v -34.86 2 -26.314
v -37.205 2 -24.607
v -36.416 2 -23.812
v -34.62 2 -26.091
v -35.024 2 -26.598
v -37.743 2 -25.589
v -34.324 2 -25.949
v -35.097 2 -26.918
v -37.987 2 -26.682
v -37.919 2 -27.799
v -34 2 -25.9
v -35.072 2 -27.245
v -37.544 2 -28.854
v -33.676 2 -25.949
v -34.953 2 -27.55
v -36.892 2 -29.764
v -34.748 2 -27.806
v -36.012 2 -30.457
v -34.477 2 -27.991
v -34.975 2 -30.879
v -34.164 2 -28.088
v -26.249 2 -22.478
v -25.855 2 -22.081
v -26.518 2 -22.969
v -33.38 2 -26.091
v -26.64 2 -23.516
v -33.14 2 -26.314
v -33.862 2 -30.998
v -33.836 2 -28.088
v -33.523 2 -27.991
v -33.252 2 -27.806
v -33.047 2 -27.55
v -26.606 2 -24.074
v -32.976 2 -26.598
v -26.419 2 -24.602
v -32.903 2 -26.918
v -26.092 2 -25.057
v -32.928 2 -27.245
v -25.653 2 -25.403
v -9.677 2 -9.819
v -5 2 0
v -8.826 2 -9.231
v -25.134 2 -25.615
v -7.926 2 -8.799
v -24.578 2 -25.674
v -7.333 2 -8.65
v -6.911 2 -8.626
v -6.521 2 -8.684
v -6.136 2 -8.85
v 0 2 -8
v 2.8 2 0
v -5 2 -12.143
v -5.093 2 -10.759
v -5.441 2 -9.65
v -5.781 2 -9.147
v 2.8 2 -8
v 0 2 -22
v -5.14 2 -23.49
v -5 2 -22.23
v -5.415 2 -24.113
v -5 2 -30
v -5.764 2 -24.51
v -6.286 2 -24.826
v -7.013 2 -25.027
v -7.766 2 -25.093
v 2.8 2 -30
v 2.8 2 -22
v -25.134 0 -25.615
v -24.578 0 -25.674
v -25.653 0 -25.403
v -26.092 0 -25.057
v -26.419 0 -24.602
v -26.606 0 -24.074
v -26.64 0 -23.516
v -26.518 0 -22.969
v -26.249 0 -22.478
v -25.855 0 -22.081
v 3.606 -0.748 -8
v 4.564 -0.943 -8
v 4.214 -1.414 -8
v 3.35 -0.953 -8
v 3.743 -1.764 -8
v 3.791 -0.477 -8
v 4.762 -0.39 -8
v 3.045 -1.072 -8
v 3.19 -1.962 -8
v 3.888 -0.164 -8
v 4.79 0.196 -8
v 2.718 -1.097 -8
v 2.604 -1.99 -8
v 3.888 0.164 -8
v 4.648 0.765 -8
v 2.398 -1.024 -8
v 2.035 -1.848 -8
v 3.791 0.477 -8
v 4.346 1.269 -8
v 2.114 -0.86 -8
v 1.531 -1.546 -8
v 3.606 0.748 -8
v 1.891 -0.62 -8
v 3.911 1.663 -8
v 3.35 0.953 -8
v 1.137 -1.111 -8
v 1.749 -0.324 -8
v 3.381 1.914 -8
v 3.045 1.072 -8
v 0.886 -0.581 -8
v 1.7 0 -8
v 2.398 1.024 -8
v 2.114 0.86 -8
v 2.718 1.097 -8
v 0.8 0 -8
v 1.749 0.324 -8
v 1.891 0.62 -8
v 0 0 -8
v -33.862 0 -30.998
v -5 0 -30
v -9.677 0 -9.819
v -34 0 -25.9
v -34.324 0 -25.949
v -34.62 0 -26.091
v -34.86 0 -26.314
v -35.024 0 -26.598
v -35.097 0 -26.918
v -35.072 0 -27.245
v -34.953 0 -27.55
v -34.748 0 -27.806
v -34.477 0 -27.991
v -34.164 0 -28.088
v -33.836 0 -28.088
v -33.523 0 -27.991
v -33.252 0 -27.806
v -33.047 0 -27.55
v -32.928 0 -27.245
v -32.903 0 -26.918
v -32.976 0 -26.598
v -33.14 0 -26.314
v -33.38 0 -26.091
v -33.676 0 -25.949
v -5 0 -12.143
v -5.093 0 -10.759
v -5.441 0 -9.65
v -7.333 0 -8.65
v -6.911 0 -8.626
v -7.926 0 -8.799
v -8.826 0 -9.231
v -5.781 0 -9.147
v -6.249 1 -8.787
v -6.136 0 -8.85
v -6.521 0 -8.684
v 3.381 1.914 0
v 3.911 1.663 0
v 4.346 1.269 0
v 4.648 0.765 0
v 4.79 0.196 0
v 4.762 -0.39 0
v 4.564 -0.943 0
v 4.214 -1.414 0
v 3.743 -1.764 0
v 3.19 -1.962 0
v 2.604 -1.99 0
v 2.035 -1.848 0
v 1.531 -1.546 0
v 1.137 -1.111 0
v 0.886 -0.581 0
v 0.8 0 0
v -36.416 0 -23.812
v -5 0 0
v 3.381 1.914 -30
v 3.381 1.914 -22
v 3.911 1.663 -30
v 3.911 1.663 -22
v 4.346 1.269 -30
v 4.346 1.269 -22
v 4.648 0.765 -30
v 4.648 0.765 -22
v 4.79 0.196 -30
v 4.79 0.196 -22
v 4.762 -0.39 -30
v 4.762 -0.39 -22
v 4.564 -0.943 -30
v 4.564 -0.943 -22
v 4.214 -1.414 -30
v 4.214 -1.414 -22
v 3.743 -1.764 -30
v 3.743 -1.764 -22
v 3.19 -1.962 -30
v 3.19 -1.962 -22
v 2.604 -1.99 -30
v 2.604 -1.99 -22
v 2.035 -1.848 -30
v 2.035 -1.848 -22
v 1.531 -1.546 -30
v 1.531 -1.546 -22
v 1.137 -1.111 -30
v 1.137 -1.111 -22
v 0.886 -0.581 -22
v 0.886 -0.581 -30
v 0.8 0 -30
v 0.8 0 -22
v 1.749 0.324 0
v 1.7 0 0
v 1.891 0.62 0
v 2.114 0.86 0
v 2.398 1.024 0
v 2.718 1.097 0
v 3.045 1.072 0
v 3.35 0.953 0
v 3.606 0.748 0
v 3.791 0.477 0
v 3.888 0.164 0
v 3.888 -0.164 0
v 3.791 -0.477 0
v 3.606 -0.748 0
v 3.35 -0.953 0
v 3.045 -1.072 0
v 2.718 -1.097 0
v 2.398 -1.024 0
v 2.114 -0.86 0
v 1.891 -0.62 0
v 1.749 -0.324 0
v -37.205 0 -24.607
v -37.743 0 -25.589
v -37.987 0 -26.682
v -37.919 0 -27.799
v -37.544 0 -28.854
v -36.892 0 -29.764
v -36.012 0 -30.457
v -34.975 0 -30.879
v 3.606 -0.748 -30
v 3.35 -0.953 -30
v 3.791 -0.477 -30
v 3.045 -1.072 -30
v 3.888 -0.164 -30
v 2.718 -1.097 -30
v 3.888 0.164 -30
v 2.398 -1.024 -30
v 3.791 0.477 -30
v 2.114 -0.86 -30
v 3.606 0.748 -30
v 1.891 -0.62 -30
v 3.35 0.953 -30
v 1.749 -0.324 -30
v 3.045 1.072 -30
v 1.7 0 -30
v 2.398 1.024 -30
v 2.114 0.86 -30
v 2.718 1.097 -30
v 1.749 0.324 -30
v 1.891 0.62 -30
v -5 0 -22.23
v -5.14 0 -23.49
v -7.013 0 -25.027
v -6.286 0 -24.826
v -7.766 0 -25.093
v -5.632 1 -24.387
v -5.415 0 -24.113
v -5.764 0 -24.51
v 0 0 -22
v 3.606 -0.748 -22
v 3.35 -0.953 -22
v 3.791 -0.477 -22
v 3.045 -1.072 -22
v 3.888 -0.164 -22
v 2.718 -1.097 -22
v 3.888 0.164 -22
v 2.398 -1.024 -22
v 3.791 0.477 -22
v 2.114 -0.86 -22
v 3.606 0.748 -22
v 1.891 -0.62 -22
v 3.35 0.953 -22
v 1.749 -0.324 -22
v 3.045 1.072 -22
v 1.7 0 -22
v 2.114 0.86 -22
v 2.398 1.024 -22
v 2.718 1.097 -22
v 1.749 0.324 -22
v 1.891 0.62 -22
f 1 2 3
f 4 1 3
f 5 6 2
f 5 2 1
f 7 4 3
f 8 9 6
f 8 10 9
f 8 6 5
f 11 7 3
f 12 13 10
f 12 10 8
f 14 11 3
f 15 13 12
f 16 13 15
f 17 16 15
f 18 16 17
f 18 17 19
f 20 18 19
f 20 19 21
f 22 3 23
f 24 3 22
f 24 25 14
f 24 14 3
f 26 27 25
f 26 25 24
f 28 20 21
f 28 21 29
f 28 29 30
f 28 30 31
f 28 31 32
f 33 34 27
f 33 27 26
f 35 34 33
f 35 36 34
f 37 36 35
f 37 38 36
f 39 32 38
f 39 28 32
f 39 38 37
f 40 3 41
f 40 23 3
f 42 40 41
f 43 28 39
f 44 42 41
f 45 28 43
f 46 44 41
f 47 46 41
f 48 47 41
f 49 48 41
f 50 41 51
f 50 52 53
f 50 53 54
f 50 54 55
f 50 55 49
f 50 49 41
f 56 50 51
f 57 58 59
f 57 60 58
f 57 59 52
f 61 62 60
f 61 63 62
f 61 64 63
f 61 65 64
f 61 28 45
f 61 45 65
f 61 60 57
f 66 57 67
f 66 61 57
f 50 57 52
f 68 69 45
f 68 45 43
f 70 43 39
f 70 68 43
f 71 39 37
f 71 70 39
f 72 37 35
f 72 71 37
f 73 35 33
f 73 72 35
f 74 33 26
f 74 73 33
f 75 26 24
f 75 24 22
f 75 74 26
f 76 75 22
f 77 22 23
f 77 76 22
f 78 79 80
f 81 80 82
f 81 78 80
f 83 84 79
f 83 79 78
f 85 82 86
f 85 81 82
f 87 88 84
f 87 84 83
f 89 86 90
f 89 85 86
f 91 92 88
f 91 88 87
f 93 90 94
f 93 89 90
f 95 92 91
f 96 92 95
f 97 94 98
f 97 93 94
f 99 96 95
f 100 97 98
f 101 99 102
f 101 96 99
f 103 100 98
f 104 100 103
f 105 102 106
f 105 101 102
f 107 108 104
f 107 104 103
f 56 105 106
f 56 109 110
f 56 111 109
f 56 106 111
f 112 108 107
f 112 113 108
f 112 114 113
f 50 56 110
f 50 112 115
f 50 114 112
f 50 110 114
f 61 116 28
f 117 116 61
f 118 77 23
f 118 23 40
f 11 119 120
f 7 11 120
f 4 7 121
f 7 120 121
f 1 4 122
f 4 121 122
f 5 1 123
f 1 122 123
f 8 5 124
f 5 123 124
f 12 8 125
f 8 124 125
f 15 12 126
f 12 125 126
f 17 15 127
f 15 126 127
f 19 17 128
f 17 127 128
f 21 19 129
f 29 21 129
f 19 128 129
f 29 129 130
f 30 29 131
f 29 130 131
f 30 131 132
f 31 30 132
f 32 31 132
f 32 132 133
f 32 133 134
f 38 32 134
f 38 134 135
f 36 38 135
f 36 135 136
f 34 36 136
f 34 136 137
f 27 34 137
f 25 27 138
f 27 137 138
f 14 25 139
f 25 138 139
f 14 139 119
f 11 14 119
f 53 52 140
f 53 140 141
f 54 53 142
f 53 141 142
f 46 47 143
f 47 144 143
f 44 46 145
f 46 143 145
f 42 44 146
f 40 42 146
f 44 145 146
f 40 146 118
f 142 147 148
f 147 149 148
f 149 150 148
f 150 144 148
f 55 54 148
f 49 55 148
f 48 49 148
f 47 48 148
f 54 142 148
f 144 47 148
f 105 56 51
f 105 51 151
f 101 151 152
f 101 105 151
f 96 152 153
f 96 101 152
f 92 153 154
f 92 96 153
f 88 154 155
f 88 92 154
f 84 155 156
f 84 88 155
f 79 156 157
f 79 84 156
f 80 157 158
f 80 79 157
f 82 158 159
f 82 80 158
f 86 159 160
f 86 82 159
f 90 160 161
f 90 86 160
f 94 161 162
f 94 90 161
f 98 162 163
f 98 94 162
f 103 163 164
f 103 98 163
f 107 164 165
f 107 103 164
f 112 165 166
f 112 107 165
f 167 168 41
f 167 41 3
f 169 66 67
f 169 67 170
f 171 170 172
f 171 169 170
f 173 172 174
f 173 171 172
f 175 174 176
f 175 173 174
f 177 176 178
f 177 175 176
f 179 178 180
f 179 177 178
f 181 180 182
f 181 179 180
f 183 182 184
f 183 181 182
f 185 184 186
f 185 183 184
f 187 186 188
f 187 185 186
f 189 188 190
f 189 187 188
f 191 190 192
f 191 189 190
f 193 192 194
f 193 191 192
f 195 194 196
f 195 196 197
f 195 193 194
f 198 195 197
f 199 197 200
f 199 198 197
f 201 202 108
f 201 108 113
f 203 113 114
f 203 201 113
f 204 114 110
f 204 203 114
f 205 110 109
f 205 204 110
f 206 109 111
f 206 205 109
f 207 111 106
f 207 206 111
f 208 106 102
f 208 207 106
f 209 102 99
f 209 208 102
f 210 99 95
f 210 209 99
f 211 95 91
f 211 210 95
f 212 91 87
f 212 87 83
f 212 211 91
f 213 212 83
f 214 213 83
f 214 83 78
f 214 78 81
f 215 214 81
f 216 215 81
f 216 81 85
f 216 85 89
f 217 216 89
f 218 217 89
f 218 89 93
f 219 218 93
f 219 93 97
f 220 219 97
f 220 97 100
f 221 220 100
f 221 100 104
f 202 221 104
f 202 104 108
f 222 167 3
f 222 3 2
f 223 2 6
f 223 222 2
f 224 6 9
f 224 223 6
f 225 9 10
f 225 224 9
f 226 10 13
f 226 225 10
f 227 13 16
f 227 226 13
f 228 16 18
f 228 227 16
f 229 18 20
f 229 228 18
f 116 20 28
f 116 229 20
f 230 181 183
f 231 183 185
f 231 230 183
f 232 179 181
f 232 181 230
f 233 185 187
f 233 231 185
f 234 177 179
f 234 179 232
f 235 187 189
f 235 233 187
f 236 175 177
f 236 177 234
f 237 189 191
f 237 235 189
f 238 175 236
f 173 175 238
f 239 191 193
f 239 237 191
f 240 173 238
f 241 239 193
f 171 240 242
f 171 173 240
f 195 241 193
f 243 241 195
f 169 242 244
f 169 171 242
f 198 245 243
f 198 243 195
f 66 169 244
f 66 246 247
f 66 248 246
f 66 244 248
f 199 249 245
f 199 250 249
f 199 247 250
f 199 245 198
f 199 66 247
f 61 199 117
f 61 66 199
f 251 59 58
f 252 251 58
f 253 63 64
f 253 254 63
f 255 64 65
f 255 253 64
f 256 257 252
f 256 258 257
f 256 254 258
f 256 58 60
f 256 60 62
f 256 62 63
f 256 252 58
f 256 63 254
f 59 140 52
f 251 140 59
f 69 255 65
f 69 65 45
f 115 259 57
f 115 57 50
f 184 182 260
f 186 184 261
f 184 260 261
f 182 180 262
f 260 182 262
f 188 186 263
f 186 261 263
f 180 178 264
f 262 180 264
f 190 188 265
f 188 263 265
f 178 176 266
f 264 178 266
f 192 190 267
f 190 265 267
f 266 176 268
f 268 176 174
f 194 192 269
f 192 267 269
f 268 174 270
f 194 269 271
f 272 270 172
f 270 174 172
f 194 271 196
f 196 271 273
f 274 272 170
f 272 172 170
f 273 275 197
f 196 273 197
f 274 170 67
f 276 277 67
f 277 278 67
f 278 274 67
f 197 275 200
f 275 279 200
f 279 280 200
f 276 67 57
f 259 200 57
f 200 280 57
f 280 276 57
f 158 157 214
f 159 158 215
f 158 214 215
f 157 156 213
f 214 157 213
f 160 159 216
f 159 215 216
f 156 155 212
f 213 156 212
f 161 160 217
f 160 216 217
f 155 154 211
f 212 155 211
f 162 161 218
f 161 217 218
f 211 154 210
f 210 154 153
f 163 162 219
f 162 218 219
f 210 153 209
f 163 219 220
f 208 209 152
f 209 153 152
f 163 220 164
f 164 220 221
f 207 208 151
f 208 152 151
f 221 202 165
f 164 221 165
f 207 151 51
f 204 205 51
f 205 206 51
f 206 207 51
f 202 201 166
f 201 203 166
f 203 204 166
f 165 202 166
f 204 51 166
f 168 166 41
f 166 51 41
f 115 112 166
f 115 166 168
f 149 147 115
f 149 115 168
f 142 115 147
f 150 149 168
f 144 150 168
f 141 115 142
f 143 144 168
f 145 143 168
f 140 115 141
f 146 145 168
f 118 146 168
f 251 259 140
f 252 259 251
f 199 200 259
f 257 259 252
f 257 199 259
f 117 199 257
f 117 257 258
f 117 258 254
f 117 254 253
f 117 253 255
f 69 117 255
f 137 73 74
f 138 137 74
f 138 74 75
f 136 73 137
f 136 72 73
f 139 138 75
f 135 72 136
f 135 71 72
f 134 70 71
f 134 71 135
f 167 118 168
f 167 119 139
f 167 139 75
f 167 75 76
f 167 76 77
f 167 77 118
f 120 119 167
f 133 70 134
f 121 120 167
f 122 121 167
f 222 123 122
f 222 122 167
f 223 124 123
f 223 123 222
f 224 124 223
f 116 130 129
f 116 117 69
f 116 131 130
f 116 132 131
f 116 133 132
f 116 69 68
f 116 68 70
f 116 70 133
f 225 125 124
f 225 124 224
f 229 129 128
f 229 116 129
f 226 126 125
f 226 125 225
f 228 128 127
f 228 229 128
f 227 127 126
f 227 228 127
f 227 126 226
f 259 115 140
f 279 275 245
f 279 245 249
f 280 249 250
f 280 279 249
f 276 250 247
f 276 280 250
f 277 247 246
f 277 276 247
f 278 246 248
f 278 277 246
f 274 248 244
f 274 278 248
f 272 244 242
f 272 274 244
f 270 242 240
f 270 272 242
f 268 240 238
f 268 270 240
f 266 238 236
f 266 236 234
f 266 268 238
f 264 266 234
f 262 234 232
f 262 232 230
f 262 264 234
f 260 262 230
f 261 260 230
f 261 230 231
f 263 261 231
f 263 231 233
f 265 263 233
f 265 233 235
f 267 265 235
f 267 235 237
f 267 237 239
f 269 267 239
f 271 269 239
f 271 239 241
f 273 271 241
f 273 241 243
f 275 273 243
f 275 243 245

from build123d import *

# Parameters (mm, degrees)
SKETCH_1_R              = 1.1
EXTRUDE_1_DEPTH         = 2
EXTRUDE_2_DEPTH         = 8
EXTRUDE_START           = -22
EXTRUDE_3_DEPTH         = 8
HOLE_WIZARD_2_2_2_2_1_D = 2.2


with BuildPart() as part:
    # 草图1 → 凸台-拉伸1 (new body)
    with BuildSketch(Plane(origin=(0, 0, 0), x_dir=(1, 0, 0), z_dir=(0, 1, 0))):
        with BuildLine():
            Line((0, 30), (0, 0))
            Line((0, 0), (5, 0))
            Line((5, 0), (36.416208358, 23.812220652))
            ThreePointArc((36.416208358, 23.812220652), (37.768928241, 28.339843241), (33.861821998, 30.997612643))
            Line((33.861821998, 30.997612643), (5, 30))
            Line((5, 30), (0, 30))
        make_face()
        with BuildLine():
            Line((5, 6.273959963), (5, 24.997014021))
            Line((5, 24.997014021), (24.577554456, 25.673714745))
            ThreePointArc((24.577554456, 25.673714745), (26.531107578, 24.344830044), (25.854747636, 22.08101875))
            Line((25.854747636, 22.08101875), (5, 6.273959963))
        make_face(mode=Mode.SUBTRACT)
        with Locations(Location((34, 27, 0), (0, 0, 270))):
            Circle(SKETCH_1_R, mode=Mode.SUBTRACT)
    extrude(amount=EXTRUDE_1_DEPTH)

    # 圆角1
    # a fillet whose section is not a circle: 3 mm, written as the material it adds along each edge (its section moved 0.00015 mm through the faces so that the kernel can cut it)
    with BuildSketch(Plane(origin=(5, 0, -6.273959963), x_dir=(-2.4841613370279438e-05, 0, -0.999999999691447), z_dir=(0, 1, 0))) as fillet_1_piece_1:
        with BuildLine():
            add(Edge.make_bspline([(6.038255155, 0), (5.16698511, 2.1644e-05), (4.295715065, 4.3288e-05), (2.48642459, -0.523937582), (1.919396592, -1.665153012), (2.594631071, -3.423603004), (3.120906314, -4.117970242), (3.647181556, -4.81233748)], knots=[0, 0, 0, 0, 0, 0, 0.5, 0.5, 1, 1, 1, 1, 1, 1], degree=5))
            Line((3.647181556, -4.81233748), (3.599363965, -4.848579417))
            ThreePointArc((3.599363965, -4.848579417), (1.775832959, -2.442365375), (-0.047817591, -0.036241938))
            Line((-0.047817591, -0.036241938), (1.49e-06, 0.06))
            ThreePointArc((1.49e-06, 0.06), (3.019129066, 0.059925), (6.038256646, 0.06))
            Line((6.038256646, 0.06), (6.038255155, 0))
        make_face()
    extrude(amount=2)
    with BuildSketch(Plane(origin=(5, 0, -24.997014021), x_dir=(-5.1758116243326517e-05, 0, 0.9999999986605487), z_dir=(0, 1, 0))) as fillet_1_piece_2:
        with BuildLine():
            add(Edge.make_bspline([(2.8980962, 0), (2.407927047, -2.537e-05), (1.917757895, -5.074e-05), (0.835707431, 0.203366759), (0.1742891, 0.842251897), (-0.066497099, 1.916604675), (-0.083455103, 2.406480399), (-0.100413106, 2.896356123)], knots=[0, 0, 0, 0, 0, 0, 0.5, 0.5, 1, 1, 1, 1, 1, 1], degree=5))
            Line((-0.100413106, 2.896356123), (-0.160377189, 2.894280349))
            ThreePointArc((-0.160377189, 2.894280349), (-0.11009568, 1.446104883), (-0.059964082, -0.002075774))
            Line((-0.059964082, -0.002075774), (3.105e-06, -0.06))
            ThreePointArc((3.105e-06, -0.06), (1.449051202, -0.059925), (2.898099305, -0.06))
            Line((2.898099305, -0.06), (2.8980962, 0))
        make_face()
    extrude(amount=2)

    # 草图2 → 凸台-拉伸2 (add)
    with BuildSketch(Plane(origin=(0, 0, -30), x_dir=(-1, 0, 0), z_dir=(0, 0, -1))):
        with BuildLine():
            Line((0, 2), (2.8, 2))
            ThreePointArc((2.8, 2), (4.214213562, -1.414213562), (0.8, 0))
            Line((0.8, 0), (0, 0))
            Line((0, 0), (0, 2))
        make_face()
    extrude(amount=-EXTRUDE_2_DEPTH)

    # 草图2<2> → 凸台-拉伸3 (add)
    with BuildSketch(Plane(origin=(0, 0, -30), x_dir=(-1, 0, 0), z_dir=(0, 0, -1)).offset(EXTRUDE_START)):
        with BuildLine():
            Line((0, 2), (2.8, 2))
            ThreePointArc((2.8, 2), (4.214213562, -1.414213562), (0.8, 0))
            Line((0.8, 0), (0, 0))
            Line((0, 0), (0, 2))
        make_face()
    extrude(amount=-EXTRUDE_3_DEPTH)

    # Ø2.2 (2.2) 直径孔1 (through all)
    with Locations(Plane(origin=(0, 0, -30), x_dir=(-1, 0, 0), z_dir=(0, 0, -1))):
        with Locations((2.8, 0)):
            Hole(HOLE_WIZARD_2_2_2_2_1_D / 2)


with BuildPart() as body_2:
    # 镜向1: mirrored copy
    add(part.part.mirror(Plane(origin=(0, 0, 0), x_dir=(0, 0, 1), z_dir=(1, 0, 0))))


solid = body_2.part
